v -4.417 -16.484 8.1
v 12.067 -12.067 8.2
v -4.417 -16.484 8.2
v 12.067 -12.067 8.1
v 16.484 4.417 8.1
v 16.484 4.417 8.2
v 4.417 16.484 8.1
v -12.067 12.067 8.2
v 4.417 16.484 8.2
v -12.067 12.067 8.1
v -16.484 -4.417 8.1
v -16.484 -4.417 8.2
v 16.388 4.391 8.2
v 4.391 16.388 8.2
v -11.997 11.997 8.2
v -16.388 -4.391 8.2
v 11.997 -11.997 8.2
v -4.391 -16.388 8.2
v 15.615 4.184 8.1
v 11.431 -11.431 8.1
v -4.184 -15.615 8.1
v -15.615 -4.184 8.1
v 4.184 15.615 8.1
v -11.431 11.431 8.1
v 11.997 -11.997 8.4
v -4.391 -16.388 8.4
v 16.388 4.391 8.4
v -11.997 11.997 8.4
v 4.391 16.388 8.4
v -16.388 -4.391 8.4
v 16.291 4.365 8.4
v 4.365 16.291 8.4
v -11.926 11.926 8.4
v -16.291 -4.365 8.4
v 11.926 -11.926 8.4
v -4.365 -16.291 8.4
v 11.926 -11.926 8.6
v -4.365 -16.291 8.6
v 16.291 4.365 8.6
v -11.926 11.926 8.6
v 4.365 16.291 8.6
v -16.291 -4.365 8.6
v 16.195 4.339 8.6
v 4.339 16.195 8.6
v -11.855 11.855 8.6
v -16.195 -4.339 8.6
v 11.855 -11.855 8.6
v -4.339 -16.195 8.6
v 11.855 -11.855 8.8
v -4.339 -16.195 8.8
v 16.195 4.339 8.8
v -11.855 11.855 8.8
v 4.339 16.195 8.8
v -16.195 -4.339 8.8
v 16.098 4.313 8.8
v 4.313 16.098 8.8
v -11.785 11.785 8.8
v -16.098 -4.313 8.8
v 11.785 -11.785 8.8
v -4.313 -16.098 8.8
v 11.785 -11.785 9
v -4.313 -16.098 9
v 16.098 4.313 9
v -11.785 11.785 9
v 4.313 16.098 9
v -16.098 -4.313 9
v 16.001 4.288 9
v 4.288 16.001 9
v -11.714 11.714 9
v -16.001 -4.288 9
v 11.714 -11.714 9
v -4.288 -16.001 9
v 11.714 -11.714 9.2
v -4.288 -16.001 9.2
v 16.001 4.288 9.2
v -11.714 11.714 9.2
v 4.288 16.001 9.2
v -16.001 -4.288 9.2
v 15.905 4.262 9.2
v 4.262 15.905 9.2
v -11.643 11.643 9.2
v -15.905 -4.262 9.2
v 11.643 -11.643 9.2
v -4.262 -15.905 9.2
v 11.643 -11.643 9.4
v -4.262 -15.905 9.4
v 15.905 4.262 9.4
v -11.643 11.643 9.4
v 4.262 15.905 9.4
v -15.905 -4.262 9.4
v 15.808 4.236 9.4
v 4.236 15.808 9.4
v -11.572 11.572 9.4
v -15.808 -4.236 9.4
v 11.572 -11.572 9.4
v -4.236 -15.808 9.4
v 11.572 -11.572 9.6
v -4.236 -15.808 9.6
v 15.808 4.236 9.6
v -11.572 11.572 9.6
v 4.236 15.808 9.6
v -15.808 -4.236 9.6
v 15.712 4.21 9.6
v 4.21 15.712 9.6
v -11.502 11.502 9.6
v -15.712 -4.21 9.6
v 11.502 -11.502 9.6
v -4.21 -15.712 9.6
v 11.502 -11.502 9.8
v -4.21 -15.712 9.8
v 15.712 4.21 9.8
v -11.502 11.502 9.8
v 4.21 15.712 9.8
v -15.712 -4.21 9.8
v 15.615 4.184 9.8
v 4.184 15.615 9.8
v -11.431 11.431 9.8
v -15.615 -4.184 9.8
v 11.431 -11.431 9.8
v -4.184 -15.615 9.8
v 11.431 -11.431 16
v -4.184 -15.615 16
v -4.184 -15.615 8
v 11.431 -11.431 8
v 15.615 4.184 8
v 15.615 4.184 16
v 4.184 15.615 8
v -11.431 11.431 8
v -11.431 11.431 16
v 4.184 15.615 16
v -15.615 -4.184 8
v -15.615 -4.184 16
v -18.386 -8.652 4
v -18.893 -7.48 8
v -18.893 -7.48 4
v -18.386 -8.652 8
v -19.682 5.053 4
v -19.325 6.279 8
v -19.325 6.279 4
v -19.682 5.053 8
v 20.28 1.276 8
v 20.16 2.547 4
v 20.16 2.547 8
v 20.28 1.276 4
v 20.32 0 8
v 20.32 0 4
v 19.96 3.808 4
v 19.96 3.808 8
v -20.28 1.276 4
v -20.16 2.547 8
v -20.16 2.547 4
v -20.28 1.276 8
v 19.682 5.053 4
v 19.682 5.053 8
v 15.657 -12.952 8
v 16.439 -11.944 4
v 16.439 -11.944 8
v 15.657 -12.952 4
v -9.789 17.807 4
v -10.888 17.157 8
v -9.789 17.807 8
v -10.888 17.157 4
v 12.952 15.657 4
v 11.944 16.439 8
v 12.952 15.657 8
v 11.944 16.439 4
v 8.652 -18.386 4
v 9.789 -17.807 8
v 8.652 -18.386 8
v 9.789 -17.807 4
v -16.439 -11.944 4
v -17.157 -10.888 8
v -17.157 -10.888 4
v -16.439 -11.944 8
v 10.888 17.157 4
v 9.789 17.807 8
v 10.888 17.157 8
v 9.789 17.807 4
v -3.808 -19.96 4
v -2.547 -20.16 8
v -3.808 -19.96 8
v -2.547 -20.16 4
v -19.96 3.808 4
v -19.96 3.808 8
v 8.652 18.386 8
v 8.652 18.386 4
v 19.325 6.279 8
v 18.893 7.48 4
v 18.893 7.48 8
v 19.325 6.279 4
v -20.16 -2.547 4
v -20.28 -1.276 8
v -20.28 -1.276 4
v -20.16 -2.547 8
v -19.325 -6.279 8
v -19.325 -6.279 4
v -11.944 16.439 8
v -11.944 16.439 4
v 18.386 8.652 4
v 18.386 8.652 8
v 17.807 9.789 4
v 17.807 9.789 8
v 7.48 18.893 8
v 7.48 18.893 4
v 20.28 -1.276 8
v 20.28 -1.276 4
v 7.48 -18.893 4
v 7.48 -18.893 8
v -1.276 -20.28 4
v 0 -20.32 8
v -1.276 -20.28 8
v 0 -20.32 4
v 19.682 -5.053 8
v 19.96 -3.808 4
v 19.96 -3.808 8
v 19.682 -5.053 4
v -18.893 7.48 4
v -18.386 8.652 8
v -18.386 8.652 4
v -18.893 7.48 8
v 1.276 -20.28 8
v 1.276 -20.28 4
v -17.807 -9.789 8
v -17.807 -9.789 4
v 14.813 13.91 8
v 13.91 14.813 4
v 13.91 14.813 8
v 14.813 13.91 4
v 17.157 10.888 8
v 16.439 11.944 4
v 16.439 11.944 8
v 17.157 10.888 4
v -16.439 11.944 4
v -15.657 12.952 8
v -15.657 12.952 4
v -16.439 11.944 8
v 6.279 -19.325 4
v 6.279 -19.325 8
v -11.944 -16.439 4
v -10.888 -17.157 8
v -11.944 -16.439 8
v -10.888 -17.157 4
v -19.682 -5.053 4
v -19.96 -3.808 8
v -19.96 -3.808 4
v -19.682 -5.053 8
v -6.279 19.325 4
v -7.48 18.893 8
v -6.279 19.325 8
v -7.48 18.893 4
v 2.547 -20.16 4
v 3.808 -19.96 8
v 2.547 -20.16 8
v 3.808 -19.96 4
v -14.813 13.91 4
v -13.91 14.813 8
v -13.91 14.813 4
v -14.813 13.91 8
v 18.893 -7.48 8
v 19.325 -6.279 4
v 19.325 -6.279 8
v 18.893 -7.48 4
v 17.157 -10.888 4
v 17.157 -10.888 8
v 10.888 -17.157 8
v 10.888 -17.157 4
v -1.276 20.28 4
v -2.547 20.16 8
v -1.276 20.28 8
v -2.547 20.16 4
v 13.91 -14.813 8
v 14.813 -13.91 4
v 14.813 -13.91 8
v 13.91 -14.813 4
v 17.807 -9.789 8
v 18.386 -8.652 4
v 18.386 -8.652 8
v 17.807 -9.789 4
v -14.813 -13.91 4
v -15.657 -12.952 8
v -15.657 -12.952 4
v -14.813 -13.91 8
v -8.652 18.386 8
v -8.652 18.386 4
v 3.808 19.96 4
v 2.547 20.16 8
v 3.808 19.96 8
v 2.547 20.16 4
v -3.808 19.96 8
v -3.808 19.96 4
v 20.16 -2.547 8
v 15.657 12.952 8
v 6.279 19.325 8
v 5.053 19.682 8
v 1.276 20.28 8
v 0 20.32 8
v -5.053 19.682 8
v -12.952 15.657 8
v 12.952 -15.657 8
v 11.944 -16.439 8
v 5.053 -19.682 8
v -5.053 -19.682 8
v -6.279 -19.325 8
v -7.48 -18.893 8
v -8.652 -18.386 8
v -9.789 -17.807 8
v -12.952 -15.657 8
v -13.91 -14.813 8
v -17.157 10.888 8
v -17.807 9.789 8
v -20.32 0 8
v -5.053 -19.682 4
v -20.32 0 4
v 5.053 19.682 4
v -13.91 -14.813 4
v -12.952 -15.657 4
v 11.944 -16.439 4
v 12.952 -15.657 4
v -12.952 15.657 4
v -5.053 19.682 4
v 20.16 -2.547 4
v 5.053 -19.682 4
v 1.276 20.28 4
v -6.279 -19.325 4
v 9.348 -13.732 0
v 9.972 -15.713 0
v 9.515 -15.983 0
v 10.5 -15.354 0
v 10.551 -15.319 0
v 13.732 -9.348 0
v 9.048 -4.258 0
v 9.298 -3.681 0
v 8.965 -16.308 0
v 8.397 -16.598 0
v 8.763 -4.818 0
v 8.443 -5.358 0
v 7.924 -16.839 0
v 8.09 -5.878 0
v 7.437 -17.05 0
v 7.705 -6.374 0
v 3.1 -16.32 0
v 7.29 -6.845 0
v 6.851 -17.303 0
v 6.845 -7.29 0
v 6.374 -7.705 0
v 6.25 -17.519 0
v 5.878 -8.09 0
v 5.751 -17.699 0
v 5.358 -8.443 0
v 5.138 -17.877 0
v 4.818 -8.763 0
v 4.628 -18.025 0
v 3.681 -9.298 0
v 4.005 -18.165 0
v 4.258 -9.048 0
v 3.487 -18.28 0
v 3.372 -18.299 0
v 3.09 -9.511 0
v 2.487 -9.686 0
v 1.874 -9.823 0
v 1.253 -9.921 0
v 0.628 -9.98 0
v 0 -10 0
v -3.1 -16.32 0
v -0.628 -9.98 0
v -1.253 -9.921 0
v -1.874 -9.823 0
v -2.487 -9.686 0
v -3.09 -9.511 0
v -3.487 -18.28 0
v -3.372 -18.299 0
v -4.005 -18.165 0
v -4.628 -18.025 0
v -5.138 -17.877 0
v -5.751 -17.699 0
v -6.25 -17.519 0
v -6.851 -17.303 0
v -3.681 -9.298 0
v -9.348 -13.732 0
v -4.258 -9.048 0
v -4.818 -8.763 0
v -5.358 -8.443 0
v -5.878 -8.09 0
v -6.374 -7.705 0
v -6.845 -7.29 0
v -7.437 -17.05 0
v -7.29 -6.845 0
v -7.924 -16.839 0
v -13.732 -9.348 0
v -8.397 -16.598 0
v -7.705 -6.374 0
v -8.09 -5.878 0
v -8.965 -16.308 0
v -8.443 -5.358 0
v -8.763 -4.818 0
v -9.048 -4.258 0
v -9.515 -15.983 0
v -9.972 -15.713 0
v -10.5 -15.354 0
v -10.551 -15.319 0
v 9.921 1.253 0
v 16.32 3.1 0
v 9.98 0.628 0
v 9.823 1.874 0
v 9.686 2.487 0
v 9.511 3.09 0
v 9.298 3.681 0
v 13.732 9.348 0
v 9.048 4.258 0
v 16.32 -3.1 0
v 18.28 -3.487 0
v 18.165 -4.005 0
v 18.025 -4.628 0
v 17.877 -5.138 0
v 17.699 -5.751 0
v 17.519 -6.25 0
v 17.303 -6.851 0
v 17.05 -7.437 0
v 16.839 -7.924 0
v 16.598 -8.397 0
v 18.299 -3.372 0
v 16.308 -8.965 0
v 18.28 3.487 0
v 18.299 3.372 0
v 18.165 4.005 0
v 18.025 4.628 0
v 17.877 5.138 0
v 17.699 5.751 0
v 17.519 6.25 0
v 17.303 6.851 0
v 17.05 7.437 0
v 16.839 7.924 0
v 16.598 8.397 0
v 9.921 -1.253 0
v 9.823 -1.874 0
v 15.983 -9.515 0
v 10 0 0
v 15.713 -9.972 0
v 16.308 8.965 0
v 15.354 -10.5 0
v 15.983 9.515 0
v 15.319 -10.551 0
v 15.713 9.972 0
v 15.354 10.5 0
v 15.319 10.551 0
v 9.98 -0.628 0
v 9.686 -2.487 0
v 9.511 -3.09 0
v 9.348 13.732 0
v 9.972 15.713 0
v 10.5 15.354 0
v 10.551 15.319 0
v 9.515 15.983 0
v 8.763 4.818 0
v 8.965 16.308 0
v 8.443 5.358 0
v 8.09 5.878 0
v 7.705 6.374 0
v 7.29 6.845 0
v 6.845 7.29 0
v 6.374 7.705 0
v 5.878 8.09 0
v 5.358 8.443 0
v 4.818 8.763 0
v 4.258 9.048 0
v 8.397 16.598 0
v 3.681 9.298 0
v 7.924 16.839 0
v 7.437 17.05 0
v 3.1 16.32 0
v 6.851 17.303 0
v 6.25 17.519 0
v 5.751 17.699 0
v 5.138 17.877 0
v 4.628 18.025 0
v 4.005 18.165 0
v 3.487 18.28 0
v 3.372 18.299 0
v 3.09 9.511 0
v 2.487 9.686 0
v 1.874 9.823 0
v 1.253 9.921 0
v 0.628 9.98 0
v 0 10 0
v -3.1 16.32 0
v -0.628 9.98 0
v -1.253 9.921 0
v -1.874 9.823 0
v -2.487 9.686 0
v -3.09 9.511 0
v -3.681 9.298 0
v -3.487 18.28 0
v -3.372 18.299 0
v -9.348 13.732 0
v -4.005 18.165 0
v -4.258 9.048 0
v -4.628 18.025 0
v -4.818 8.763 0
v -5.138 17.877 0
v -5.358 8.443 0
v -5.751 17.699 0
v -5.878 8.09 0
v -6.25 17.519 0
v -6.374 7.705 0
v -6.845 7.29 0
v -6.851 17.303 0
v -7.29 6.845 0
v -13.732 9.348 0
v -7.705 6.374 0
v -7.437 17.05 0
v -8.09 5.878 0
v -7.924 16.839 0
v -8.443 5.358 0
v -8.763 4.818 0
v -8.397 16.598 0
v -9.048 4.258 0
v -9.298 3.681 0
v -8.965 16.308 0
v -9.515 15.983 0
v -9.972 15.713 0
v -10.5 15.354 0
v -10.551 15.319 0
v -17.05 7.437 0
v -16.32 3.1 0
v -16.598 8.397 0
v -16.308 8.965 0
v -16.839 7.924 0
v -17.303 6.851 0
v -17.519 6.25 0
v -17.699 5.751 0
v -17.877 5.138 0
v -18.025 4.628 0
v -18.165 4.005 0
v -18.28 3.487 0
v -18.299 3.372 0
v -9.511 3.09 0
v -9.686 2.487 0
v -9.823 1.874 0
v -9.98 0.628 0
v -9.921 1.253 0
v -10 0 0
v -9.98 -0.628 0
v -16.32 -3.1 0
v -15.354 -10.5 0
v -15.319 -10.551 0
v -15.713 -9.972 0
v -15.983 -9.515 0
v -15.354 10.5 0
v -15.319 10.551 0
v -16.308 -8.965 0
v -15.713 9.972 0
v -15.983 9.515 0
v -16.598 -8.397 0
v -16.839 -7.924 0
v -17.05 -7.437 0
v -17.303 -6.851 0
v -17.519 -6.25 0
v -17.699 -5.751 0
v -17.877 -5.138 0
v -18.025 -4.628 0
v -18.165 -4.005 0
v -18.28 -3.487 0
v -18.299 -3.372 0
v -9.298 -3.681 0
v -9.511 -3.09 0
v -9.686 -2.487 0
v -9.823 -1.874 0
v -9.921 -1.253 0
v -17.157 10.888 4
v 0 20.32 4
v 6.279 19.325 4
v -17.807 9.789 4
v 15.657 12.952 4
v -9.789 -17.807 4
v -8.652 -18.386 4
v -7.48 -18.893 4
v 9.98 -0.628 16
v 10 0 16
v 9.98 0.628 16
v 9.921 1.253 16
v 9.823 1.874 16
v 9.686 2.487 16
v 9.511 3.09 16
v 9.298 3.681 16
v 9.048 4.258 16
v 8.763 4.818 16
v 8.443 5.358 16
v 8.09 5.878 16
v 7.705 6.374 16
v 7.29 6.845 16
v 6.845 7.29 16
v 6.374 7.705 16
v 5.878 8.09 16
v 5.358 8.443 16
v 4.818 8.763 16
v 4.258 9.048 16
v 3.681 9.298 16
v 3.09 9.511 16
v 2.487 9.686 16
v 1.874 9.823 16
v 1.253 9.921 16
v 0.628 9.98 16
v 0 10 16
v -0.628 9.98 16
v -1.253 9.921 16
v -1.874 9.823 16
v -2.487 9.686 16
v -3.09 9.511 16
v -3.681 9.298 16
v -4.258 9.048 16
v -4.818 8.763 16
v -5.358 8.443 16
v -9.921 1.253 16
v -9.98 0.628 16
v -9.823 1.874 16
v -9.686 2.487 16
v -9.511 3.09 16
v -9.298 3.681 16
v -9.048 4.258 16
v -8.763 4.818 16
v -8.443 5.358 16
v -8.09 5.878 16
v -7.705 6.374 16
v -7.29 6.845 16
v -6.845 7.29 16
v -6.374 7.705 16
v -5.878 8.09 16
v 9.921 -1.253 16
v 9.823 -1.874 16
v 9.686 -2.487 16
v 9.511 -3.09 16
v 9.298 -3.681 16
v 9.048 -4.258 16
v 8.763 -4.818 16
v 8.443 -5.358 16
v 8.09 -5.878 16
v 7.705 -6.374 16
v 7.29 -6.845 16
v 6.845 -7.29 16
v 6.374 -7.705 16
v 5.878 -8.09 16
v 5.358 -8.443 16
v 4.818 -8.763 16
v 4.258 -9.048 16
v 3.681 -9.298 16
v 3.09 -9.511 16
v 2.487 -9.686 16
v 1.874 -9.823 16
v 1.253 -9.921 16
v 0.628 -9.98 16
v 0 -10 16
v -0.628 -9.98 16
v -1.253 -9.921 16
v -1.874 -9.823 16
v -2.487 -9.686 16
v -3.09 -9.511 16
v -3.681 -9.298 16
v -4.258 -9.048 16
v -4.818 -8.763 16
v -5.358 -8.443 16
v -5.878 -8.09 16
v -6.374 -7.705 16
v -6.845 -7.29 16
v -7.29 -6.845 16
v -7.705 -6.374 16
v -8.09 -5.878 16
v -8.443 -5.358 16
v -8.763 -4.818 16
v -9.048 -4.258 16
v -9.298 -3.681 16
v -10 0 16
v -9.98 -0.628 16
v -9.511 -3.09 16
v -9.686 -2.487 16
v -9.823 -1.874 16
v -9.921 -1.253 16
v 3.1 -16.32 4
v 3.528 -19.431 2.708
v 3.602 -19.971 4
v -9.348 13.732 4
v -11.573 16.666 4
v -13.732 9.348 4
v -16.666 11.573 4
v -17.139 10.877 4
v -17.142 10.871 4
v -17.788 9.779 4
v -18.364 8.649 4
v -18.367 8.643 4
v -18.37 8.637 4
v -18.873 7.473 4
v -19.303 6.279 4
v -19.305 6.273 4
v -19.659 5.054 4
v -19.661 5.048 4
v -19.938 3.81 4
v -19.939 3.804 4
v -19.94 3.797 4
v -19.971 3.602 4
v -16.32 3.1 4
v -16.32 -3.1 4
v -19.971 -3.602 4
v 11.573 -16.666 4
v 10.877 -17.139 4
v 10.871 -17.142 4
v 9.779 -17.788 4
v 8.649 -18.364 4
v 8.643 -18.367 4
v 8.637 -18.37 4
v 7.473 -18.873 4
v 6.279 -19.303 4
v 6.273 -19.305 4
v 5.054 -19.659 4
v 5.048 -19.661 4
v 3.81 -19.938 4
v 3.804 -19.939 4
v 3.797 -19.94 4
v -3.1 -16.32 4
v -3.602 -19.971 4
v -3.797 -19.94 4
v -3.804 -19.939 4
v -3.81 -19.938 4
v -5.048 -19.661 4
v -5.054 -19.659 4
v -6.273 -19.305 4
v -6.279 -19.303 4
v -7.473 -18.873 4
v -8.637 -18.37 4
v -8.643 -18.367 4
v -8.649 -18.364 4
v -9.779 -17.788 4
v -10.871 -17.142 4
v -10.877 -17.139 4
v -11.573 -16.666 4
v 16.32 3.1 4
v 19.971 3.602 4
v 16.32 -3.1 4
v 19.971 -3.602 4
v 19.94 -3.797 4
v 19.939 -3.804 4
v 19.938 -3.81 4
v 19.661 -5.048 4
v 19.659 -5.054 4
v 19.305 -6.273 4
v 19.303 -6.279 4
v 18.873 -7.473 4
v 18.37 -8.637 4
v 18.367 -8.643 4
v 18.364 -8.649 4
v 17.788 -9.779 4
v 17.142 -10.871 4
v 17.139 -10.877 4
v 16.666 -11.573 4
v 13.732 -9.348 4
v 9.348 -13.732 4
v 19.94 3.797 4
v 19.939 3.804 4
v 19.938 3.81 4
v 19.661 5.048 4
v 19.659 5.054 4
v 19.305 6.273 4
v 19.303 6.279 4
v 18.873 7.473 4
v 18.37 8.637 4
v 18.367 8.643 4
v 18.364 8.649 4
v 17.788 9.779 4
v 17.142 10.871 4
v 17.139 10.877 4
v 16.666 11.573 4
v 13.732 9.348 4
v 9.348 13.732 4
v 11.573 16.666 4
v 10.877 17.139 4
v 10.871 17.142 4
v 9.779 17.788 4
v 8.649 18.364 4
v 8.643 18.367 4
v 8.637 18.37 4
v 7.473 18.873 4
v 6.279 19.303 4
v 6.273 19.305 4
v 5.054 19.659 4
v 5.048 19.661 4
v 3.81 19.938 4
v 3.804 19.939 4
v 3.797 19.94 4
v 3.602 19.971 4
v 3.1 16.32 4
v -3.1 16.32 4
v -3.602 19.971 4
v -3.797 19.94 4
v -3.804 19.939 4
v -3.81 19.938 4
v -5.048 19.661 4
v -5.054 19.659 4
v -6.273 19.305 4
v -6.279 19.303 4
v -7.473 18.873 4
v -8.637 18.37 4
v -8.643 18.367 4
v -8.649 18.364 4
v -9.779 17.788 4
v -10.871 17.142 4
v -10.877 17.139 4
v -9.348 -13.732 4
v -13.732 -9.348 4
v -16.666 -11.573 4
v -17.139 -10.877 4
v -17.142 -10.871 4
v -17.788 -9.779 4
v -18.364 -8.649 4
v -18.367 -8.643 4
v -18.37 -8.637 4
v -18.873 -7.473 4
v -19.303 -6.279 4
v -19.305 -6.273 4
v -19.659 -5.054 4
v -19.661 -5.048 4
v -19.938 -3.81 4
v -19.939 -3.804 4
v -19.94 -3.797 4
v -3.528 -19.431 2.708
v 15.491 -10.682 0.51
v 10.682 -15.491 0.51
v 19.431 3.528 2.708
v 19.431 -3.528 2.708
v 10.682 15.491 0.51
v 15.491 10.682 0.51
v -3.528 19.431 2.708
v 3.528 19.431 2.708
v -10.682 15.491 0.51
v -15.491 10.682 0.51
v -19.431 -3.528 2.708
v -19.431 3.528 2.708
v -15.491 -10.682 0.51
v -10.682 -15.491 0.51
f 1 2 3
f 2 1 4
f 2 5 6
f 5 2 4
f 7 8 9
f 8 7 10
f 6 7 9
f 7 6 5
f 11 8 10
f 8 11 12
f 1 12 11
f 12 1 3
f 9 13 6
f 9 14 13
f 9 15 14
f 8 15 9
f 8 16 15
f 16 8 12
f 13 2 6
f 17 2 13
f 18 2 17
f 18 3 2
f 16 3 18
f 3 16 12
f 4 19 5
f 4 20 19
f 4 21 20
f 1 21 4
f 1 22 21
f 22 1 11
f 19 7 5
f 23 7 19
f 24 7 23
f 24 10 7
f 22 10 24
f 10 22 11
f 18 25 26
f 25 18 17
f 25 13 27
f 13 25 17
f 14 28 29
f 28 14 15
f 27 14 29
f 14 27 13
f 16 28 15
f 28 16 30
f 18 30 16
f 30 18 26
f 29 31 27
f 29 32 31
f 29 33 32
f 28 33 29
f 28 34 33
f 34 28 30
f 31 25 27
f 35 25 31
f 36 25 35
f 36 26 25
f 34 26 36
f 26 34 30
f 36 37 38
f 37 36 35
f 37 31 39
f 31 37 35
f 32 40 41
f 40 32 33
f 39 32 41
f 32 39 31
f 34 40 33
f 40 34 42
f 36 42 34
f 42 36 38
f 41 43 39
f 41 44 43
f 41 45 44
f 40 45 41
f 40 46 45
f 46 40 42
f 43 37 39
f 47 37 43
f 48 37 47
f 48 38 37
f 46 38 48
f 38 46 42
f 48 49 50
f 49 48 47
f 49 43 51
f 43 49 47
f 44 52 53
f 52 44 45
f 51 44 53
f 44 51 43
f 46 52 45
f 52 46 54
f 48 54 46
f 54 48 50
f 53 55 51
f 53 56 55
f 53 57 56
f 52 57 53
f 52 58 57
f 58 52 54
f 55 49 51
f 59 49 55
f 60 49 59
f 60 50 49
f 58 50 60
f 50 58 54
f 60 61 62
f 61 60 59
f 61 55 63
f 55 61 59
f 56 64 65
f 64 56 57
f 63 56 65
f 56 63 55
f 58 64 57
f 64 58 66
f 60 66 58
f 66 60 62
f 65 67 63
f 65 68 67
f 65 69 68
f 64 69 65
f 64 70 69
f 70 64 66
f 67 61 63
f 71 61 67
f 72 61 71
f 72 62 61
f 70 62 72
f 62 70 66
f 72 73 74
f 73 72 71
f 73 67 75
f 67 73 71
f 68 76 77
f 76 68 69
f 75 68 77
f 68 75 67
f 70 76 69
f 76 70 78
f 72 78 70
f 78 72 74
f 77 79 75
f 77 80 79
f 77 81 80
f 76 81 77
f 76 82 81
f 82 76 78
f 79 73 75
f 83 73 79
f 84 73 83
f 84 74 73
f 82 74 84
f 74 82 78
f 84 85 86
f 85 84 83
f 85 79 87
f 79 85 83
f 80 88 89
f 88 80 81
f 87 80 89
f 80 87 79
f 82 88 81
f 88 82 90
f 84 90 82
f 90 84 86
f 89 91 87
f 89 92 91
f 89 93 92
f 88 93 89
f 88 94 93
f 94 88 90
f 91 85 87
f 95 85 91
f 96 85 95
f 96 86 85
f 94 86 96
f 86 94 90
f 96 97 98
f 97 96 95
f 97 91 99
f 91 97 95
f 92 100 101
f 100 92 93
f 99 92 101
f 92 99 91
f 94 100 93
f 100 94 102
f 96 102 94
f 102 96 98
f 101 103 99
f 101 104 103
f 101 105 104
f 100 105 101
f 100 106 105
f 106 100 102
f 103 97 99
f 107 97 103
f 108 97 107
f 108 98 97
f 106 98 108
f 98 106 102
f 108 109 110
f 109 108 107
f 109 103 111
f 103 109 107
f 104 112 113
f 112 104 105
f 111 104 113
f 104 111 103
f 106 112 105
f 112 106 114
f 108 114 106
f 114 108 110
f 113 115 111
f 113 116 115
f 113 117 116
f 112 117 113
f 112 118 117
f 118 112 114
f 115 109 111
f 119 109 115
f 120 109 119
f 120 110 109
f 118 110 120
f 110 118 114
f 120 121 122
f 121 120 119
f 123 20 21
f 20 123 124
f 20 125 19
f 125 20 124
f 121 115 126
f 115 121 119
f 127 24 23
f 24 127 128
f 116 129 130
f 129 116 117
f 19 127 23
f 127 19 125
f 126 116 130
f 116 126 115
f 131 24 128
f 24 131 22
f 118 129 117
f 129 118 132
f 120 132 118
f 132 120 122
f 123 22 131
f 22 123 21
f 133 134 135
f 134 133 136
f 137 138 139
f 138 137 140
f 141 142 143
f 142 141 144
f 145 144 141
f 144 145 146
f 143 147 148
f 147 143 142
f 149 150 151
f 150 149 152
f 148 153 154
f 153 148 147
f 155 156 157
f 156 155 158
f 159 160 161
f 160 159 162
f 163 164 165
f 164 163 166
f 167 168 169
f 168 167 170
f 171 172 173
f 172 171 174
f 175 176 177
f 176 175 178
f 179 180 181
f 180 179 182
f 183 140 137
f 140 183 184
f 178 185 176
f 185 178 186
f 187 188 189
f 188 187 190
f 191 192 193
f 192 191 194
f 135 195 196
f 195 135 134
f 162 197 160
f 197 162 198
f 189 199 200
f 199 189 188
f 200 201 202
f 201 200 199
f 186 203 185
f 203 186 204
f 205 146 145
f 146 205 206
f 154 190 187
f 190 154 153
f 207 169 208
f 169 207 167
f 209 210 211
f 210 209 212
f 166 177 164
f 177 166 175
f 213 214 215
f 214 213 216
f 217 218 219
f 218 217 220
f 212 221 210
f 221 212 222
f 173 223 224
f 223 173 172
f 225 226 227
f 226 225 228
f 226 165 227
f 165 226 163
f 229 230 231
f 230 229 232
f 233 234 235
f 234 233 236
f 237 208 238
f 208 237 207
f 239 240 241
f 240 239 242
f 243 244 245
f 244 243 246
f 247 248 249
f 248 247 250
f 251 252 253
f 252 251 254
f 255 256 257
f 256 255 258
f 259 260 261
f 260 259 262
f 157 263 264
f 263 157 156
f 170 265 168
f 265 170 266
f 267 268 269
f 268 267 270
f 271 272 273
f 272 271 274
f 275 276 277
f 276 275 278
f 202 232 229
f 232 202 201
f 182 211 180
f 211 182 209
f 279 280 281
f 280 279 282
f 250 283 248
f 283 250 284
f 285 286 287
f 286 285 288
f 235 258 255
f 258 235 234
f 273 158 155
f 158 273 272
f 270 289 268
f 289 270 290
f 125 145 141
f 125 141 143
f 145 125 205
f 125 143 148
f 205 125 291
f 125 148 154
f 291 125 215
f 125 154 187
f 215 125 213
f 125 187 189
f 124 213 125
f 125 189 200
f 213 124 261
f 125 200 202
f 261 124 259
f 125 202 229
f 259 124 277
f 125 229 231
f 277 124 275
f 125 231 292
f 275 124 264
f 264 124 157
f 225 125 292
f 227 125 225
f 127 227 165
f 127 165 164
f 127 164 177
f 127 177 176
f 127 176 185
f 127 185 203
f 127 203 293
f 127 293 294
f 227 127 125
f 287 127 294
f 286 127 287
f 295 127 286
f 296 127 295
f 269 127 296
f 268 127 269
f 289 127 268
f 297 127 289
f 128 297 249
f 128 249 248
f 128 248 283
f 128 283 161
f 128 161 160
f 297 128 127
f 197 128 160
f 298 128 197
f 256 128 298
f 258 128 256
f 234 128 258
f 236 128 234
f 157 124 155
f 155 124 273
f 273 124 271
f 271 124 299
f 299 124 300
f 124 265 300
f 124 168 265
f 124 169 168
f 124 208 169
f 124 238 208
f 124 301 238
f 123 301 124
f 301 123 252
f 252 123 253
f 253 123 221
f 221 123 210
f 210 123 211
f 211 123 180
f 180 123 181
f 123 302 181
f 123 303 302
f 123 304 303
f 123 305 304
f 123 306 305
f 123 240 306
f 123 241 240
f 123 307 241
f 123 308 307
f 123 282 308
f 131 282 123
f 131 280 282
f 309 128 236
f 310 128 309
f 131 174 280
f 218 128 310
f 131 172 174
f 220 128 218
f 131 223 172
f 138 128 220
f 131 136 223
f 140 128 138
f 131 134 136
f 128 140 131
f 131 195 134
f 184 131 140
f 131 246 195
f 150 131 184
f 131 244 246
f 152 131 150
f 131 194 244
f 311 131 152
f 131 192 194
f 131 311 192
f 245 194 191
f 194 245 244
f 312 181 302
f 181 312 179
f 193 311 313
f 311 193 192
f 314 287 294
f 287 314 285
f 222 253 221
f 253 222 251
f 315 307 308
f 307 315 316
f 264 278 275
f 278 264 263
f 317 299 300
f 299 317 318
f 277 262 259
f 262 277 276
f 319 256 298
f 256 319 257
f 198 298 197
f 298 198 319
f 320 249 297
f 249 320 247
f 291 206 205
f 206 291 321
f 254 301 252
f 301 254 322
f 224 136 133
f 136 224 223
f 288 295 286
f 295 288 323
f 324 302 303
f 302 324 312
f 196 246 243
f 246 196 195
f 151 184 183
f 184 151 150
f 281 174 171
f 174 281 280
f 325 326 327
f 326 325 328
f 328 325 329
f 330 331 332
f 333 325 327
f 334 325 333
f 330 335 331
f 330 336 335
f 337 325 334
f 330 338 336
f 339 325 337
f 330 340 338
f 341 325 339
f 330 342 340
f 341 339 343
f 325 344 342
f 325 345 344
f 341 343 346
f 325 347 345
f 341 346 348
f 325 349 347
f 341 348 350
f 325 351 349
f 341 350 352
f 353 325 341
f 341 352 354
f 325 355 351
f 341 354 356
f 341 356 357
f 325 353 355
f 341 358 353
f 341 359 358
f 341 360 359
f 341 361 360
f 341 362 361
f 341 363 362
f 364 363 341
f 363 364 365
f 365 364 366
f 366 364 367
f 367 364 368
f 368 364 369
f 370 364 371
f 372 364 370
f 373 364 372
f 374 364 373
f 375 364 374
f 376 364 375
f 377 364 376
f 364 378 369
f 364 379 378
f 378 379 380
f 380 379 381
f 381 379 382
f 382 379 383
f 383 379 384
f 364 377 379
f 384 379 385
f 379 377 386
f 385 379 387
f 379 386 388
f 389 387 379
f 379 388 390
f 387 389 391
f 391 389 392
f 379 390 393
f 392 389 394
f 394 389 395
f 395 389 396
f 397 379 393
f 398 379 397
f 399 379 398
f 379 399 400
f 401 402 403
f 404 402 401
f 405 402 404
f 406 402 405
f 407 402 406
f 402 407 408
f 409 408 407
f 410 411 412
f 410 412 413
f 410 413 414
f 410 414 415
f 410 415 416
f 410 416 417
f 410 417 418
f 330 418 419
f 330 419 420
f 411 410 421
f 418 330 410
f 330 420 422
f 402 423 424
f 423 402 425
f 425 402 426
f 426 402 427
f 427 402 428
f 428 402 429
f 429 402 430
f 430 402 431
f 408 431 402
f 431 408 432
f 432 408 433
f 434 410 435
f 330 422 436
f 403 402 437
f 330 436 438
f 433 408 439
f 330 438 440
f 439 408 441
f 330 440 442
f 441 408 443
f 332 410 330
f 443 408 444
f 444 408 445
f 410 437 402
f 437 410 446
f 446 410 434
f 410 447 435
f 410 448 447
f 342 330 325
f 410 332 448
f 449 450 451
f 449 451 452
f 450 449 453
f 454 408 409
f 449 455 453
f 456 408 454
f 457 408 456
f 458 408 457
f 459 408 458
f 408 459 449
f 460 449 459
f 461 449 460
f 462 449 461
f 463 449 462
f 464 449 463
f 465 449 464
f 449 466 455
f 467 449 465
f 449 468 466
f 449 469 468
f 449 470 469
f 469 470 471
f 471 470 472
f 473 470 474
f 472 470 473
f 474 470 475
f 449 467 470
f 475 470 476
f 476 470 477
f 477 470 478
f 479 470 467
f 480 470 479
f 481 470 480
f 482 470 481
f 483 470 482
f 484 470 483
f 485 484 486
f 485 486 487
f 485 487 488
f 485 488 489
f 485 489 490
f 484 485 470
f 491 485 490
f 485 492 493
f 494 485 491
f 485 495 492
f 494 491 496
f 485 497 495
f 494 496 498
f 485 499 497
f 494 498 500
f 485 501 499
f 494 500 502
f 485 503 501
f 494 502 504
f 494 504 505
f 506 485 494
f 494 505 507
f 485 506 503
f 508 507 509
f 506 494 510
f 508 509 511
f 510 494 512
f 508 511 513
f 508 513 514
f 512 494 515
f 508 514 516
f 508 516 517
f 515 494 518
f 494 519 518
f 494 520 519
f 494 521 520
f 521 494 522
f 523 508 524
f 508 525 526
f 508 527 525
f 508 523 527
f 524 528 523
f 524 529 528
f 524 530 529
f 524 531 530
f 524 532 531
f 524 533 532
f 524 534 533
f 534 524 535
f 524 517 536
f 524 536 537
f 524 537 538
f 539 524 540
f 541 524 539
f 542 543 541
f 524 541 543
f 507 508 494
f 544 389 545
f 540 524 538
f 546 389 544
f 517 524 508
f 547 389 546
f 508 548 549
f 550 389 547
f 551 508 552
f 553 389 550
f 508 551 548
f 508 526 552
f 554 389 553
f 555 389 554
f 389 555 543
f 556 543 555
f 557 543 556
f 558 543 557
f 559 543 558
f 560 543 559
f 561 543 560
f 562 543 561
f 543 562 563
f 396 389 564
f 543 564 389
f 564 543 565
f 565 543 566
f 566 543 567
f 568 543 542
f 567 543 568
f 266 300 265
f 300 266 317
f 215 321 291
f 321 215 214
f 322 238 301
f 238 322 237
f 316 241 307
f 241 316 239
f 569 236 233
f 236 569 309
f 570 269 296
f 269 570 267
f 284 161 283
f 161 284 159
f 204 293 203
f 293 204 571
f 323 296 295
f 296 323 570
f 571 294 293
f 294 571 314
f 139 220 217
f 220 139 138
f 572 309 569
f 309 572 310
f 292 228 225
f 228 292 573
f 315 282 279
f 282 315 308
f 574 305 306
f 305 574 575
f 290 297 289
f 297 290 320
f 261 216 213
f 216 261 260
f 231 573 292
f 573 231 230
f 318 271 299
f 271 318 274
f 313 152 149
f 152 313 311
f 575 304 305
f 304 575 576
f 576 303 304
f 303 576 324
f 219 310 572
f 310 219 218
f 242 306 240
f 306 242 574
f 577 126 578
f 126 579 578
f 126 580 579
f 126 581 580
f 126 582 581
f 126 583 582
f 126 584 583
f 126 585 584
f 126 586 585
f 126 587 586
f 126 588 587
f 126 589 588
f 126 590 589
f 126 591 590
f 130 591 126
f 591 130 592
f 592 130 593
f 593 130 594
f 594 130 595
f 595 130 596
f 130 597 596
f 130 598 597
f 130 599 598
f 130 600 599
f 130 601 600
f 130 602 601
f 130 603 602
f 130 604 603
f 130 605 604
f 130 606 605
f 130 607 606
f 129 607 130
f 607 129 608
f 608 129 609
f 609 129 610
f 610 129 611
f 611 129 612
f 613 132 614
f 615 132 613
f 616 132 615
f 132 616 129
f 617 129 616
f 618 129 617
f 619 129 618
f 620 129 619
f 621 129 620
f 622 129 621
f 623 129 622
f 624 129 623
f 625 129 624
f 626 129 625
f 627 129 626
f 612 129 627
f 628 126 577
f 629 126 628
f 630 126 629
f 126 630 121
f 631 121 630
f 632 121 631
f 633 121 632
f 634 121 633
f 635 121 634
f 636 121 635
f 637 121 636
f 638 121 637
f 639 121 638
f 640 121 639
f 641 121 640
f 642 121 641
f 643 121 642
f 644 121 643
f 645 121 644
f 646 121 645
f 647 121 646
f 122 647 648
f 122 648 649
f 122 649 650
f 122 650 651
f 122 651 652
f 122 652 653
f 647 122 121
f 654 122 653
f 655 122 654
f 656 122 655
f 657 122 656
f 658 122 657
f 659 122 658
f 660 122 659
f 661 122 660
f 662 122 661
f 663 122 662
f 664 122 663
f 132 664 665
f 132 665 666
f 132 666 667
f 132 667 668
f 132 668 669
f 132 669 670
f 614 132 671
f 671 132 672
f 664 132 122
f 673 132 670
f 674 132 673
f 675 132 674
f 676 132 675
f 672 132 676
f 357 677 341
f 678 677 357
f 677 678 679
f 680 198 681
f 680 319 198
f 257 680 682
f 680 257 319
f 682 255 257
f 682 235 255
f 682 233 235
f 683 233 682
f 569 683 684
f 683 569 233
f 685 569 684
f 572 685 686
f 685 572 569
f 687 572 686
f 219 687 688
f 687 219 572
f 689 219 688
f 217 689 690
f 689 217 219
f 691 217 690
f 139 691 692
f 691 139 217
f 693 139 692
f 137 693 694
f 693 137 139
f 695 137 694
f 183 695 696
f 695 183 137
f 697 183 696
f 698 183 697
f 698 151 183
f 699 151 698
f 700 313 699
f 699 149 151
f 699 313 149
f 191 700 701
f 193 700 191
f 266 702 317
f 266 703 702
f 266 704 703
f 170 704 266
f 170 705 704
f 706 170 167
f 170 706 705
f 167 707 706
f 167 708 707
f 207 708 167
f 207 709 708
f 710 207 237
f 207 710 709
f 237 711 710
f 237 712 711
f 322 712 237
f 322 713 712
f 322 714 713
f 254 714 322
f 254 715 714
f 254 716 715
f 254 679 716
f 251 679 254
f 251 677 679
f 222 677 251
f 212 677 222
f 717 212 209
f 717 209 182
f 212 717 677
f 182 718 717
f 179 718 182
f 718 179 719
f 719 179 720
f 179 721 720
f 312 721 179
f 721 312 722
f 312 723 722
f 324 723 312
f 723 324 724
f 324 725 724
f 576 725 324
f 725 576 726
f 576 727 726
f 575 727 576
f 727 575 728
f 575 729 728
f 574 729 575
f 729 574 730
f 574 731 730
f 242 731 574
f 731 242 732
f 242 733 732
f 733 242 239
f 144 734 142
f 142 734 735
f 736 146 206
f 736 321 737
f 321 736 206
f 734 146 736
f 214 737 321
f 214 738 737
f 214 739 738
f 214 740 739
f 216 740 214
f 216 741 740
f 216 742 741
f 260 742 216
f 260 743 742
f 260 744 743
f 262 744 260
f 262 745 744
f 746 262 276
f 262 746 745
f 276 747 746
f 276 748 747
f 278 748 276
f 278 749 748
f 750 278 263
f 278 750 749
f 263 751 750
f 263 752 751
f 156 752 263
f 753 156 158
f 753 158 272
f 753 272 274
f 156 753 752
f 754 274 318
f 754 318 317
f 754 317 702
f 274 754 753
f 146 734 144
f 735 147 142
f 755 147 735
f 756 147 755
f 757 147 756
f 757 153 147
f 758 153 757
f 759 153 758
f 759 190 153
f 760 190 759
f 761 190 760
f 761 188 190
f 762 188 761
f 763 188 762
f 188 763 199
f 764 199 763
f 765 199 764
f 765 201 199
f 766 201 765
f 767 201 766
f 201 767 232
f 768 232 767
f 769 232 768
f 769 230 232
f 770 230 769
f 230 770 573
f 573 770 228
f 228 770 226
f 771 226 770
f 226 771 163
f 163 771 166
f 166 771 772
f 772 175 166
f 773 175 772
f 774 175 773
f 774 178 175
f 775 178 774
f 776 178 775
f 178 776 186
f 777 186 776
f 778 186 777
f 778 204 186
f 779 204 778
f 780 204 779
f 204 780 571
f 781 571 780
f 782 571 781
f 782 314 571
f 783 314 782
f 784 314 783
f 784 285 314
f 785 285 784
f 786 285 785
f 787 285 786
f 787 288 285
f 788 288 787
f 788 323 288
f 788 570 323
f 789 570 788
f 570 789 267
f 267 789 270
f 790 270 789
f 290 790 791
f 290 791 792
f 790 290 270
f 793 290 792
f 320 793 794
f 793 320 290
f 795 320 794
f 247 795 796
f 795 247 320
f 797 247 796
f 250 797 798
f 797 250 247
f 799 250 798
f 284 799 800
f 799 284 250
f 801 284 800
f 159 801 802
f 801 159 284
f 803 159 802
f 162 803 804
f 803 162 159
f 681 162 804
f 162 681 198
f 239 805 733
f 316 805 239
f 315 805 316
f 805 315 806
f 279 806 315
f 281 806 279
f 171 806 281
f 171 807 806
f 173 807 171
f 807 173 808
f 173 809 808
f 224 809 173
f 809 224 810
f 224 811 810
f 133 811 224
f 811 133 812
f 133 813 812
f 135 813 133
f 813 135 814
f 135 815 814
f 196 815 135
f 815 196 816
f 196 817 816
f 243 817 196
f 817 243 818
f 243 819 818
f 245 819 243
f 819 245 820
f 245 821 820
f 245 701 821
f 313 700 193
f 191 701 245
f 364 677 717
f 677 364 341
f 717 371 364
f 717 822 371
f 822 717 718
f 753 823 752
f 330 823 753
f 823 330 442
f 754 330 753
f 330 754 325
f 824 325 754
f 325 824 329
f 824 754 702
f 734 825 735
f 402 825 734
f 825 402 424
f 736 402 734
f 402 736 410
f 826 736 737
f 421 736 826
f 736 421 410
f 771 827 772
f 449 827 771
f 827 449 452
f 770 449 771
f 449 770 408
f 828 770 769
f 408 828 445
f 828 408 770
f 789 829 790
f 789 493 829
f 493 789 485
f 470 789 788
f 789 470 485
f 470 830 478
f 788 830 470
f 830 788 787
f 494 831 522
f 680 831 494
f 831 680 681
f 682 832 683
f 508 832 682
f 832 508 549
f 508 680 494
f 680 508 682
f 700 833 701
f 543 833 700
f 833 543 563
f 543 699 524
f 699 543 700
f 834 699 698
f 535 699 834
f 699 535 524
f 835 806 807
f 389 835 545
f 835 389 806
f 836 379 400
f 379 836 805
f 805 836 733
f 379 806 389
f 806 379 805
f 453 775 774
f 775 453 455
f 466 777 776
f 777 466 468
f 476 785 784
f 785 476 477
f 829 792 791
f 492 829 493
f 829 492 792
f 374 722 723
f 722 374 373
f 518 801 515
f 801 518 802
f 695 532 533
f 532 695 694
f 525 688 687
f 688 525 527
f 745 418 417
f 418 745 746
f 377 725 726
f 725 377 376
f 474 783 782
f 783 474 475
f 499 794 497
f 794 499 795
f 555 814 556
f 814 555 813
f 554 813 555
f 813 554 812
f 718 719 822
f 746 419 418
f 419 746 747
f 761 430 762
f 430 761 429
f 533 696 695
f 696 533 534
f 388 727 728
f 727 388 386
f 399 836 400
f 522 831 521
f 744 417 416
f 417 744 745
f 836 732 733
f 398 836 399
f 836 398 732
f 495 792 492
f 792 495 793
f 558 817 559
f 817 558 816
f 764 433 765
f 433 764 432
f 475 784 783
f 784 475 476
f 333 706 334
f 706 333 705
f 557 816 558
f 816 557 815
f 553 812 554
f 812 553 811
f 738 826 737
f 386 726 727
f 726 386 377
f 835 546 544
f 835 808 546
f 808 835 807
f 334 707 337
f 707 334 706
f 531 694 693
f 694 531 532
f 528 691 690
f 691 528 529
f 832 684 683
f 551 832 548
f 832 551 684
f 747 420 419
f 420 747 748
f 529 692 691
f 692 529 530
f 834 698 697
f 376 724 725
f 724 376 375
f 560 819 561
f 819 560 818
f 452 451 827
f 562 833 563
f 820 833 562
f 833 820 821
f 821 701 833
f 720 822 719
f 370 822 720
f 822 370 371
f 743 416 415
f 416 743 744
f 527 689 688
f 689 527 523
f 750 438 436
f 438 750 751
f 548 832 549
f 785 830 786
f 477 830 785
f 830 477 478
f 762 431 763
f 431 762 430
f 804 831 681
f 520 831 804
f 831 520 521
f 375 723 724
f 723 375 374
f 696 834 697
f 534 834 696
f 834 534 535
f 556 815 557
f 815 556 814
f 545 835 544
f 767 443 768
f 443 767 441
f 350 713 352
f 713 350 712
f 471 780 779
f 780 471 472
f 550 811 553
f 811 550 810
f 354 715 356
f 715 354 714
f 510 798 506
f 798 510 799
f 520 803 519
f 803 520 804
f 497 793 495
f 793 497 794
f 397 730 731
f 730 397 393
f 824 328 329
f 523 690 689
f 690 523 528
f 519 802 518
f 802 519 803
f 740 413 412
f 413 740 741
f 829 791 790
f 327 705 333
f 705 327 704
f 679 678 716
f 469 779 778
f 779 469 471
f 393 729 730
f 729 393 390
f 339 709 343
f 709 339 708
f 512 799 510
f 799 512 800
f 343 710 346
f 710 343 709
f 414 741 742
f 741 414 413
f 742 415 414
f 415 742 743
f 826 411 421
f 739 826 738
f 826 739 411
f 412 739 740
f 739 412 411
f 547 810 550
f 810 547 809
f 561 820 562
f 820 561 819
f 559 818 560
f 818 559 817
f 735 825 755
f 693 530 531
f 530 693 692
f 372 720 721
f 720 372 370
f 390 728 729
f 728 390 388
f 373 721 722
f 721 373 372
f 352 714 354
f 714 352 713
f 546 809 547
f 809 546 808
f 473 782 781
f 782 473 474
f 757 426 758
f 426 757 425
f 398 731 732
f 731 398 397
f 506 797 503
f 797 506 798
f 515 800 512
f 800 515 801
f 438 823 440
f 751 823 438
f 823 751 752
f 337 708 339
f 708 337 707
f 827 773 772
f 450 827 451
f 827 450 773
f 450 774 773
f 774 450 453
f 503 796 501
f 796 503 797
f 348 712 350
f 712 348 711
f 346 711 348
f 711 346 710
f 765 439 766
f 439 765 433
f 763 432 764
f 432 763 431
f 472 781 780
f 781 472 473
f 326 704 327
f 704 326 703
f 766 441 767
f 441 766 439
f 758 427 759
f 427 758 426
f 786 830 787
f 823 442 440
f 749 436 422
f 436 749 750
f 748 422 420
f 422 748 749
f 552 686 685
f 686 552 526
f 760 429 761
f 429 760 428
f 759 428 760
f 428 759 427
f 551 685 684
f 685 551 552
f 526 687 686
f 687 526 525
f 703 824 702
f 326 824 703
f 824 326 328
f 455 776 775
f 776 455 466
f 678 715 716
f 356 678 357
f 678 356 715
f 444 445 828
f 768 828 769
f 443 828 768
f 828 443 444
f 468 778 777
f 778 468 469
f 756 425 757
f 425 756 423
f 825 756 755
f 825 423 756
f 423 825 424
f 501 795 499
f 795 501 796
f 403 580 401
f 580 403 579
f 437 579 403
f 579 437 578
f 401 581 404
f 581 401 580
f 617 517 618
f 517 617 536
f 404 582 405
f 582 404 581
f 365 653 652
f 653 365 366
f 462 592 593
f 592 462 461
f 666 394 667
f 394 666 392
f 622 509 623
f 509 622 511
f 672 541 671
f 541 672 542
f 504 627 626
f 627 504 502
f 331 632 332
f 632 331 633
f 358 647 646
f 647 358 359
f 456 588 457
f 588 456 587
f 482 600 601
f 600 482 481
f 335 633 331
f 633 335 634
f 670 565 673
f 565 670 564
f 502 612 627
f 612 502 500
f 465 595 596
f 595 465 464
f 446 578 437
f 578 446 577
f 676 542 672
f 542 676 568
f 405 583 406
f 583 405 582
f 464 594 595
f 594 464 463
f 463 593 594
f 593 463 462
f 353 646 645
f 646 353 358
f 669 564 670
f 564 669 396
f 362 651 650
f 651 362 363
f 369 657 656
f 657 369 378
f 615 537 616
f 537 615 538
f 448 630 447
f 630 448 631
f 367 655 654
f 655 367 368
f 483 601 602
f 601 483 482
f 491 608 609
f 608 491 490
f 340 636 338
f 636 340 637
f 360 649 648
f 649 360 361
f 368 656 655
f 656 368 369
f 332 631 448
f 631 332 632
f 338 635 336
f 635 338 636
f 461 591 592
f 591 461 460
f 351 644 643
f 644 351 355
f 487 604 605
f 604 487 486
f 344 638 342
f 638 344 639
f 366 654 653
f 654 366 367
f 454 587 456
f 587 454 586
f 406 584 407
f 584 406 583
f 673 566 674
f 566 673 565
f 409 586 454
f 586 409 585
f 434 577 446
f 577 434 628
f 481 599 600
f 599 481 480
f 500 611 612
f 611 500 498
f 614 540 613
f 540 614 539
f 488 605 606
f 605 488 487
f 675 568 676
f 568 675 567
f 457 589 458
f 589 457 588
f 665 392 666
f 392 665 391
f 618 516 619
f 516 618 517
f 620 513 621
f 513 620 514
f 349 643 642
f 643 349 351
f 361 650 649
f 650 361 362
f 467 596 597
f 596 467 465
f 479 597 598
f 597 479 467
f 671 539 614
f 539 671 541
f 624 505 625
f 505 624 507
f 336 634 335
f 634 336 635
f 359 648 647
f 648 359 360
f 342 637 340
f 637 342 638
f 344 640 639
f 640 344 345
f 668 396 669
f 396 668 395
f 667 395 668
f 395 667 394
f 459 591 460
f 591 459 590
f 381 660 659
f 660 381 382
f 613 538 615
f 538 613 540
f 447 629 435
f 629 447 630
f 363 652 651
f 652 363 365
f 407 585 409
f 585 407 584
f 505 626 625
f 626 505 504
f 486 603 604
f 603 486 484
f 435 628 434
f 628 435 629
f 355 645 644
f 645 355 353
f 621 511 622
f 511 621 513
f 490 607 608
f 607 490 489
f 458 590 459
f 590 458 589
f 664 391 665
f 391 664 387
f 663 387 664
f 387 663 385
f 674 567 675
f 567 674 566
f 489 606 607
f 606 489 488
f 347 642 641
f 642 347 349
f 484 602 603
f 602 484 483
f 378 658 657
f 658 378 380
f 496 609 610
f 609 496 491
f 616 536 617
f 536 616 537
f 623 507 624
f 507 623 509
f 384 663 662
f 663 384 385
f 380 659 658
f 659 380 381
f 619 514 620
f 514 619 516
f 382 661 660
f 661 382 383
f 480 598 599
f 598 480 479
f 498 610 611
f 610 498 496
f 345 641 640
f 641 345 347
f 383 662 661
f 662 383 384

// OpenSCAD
// file: apothem.scad
// Constructing polygons with the 'circle' command and $fn set to 'N' number of
// sides is common quick construction technique in openscad. 
//
// apothem is the distance from the center of a regular N gon to a midpoint of a side
//
// Calculate the apothem given the radius and a specific N-gon (this approaches
// the radius as N-->infinity   
function apothem(radius,num_sides) =  radius * cos(180/num_sides);
//
// Calculate the radius given an apothem and a specific N-gon 
// validate that num_sides is an integer >= 3
function radius_from_apothem(apothem,num_sides) = apothem / cos(180/num_sides);
// file: arrayPolar.scad
//arrayPolar
//arrayPolar( count, arc, radius, rotation, tilt)

module arrayPolar(count = 1, arc = 360, radius = 1,rotation = 0, tilt = 0 ){
  for (i = [0 : count - 1]){
    angle = arc / count * i;
    echo("angle =" , angle);
    rotate([0,0,rotation])
    translate(radius * [sin(angle),-cos(angle),0])
    rotate(tilt * [-cos(angle) ,-sin(angle), 0])
    rotate([0,0,angle-90])
    children();
  } 
}
// main file
use <arrayPolar.scad>
use <apothem.scad>
// apothem(radius,num_sides)
// radius_from_apothem(apothem,num_sides)
//arrayPolar( count, arc, radius, rotation, tilt)
$fn = 100;
eps = 0.1;

// measurements for a gear part
outer_diameter=50;  // mm
inner_diameter_upper=40.64; // mm
inner_diameter_slope=33.8; // mm
hex_nut_diameter = 28; // mm a good standard socket size
threaded_axle_diameter=19; // mm this includes diameter of hex nut on axle
axle_spacing=1; // 

gear_num_teeth=8; // number of teeth
gear_height = 8;

// trapezoidal geartooth measurements
lx = 7.3; //  long side dimension
sx = 6.2; // short side dimension
tooth_height  =4; // height

// creates a trapezoidal gear tooth along the X axis, towards Y pos along the X axis
module trapezoidal_gear_tooth(long_length,short_length,height){
  linear_extrude(10)
  {
    union()
    {
      polygon(points =
      [[0,0],[long_length/2,0],[short_length/2,height],[0,height]], paths = [[0,1,2,3]], convexity =5);
      mirror([1,0,0])
      {
        polygon(points =
	[[0,0],[long_length/2,0],[short_length/2,height],[0,height]], paths = [[0,1,2,3]], convexity =5);
      }
    }
  }
}

module bikewrench()
{
  arrayPolar(8,360,inner_diameter_upper/2-tooth_height/2,0,0)
  translate([tooth_height/2,0,-6])rotate([0,0,90])trapezoidal_gear_tooth(lx,sx,tooth_height);
    difference ()
    {
      cylinder(r=outer_diameter/2,h=gear_height,center=true);
      rotate([0,180,0])
      cylinder(r1=inner_diameter_upper/2,r2=inner_diameter_slope/2,h=gear_height+eps,center=true);
    }
}


scale([1,1,1])
{
  difference()
  {
    
    union()
    {

      // the body of the tool from which the bikewrench part will be subtracted below
      cylinder(r=inner_diameter_upper/2,h=8);
      // built in hex turn nut, not $fn is 6 here for a hex turn nut
      //rotate([0,0,15])translate([0,0,8])cylinder(r=inner_diameter_upper/2-5,h=8,$fn=6);
      rotate([0,0,15])translate([0,0,8])cylinder(r=radius_from_apothem(hex_nut_diameter/2,6),h=8,$fn=6);
      echo("hex nut circumcircle diameter = ", radius_from_apothem(hex_nut_diameter/2,6)*2);
      // loop for some smooth transition between lower wrench and built in hex turn nut
      for(i = [0:10])
      {
        rotate([0,0,15])translate([0,0,8+i*0.1])cylinder(r=radius_from_apothem(hex_nut_diameter/2,6)+1-i*0.1,h=i*0.1,$fn=6);
      }
    }
    union()
    {
      // the wrench part we want to tighten the sprocket on the hub
      bikewrench();
      // spacing for the threaded axle rod and hex nuts
      translate([0,0,-1])cylinder(r=threaded_axle_diameter/2+axle_spacing/2,h=20);
    }  
  }
}
